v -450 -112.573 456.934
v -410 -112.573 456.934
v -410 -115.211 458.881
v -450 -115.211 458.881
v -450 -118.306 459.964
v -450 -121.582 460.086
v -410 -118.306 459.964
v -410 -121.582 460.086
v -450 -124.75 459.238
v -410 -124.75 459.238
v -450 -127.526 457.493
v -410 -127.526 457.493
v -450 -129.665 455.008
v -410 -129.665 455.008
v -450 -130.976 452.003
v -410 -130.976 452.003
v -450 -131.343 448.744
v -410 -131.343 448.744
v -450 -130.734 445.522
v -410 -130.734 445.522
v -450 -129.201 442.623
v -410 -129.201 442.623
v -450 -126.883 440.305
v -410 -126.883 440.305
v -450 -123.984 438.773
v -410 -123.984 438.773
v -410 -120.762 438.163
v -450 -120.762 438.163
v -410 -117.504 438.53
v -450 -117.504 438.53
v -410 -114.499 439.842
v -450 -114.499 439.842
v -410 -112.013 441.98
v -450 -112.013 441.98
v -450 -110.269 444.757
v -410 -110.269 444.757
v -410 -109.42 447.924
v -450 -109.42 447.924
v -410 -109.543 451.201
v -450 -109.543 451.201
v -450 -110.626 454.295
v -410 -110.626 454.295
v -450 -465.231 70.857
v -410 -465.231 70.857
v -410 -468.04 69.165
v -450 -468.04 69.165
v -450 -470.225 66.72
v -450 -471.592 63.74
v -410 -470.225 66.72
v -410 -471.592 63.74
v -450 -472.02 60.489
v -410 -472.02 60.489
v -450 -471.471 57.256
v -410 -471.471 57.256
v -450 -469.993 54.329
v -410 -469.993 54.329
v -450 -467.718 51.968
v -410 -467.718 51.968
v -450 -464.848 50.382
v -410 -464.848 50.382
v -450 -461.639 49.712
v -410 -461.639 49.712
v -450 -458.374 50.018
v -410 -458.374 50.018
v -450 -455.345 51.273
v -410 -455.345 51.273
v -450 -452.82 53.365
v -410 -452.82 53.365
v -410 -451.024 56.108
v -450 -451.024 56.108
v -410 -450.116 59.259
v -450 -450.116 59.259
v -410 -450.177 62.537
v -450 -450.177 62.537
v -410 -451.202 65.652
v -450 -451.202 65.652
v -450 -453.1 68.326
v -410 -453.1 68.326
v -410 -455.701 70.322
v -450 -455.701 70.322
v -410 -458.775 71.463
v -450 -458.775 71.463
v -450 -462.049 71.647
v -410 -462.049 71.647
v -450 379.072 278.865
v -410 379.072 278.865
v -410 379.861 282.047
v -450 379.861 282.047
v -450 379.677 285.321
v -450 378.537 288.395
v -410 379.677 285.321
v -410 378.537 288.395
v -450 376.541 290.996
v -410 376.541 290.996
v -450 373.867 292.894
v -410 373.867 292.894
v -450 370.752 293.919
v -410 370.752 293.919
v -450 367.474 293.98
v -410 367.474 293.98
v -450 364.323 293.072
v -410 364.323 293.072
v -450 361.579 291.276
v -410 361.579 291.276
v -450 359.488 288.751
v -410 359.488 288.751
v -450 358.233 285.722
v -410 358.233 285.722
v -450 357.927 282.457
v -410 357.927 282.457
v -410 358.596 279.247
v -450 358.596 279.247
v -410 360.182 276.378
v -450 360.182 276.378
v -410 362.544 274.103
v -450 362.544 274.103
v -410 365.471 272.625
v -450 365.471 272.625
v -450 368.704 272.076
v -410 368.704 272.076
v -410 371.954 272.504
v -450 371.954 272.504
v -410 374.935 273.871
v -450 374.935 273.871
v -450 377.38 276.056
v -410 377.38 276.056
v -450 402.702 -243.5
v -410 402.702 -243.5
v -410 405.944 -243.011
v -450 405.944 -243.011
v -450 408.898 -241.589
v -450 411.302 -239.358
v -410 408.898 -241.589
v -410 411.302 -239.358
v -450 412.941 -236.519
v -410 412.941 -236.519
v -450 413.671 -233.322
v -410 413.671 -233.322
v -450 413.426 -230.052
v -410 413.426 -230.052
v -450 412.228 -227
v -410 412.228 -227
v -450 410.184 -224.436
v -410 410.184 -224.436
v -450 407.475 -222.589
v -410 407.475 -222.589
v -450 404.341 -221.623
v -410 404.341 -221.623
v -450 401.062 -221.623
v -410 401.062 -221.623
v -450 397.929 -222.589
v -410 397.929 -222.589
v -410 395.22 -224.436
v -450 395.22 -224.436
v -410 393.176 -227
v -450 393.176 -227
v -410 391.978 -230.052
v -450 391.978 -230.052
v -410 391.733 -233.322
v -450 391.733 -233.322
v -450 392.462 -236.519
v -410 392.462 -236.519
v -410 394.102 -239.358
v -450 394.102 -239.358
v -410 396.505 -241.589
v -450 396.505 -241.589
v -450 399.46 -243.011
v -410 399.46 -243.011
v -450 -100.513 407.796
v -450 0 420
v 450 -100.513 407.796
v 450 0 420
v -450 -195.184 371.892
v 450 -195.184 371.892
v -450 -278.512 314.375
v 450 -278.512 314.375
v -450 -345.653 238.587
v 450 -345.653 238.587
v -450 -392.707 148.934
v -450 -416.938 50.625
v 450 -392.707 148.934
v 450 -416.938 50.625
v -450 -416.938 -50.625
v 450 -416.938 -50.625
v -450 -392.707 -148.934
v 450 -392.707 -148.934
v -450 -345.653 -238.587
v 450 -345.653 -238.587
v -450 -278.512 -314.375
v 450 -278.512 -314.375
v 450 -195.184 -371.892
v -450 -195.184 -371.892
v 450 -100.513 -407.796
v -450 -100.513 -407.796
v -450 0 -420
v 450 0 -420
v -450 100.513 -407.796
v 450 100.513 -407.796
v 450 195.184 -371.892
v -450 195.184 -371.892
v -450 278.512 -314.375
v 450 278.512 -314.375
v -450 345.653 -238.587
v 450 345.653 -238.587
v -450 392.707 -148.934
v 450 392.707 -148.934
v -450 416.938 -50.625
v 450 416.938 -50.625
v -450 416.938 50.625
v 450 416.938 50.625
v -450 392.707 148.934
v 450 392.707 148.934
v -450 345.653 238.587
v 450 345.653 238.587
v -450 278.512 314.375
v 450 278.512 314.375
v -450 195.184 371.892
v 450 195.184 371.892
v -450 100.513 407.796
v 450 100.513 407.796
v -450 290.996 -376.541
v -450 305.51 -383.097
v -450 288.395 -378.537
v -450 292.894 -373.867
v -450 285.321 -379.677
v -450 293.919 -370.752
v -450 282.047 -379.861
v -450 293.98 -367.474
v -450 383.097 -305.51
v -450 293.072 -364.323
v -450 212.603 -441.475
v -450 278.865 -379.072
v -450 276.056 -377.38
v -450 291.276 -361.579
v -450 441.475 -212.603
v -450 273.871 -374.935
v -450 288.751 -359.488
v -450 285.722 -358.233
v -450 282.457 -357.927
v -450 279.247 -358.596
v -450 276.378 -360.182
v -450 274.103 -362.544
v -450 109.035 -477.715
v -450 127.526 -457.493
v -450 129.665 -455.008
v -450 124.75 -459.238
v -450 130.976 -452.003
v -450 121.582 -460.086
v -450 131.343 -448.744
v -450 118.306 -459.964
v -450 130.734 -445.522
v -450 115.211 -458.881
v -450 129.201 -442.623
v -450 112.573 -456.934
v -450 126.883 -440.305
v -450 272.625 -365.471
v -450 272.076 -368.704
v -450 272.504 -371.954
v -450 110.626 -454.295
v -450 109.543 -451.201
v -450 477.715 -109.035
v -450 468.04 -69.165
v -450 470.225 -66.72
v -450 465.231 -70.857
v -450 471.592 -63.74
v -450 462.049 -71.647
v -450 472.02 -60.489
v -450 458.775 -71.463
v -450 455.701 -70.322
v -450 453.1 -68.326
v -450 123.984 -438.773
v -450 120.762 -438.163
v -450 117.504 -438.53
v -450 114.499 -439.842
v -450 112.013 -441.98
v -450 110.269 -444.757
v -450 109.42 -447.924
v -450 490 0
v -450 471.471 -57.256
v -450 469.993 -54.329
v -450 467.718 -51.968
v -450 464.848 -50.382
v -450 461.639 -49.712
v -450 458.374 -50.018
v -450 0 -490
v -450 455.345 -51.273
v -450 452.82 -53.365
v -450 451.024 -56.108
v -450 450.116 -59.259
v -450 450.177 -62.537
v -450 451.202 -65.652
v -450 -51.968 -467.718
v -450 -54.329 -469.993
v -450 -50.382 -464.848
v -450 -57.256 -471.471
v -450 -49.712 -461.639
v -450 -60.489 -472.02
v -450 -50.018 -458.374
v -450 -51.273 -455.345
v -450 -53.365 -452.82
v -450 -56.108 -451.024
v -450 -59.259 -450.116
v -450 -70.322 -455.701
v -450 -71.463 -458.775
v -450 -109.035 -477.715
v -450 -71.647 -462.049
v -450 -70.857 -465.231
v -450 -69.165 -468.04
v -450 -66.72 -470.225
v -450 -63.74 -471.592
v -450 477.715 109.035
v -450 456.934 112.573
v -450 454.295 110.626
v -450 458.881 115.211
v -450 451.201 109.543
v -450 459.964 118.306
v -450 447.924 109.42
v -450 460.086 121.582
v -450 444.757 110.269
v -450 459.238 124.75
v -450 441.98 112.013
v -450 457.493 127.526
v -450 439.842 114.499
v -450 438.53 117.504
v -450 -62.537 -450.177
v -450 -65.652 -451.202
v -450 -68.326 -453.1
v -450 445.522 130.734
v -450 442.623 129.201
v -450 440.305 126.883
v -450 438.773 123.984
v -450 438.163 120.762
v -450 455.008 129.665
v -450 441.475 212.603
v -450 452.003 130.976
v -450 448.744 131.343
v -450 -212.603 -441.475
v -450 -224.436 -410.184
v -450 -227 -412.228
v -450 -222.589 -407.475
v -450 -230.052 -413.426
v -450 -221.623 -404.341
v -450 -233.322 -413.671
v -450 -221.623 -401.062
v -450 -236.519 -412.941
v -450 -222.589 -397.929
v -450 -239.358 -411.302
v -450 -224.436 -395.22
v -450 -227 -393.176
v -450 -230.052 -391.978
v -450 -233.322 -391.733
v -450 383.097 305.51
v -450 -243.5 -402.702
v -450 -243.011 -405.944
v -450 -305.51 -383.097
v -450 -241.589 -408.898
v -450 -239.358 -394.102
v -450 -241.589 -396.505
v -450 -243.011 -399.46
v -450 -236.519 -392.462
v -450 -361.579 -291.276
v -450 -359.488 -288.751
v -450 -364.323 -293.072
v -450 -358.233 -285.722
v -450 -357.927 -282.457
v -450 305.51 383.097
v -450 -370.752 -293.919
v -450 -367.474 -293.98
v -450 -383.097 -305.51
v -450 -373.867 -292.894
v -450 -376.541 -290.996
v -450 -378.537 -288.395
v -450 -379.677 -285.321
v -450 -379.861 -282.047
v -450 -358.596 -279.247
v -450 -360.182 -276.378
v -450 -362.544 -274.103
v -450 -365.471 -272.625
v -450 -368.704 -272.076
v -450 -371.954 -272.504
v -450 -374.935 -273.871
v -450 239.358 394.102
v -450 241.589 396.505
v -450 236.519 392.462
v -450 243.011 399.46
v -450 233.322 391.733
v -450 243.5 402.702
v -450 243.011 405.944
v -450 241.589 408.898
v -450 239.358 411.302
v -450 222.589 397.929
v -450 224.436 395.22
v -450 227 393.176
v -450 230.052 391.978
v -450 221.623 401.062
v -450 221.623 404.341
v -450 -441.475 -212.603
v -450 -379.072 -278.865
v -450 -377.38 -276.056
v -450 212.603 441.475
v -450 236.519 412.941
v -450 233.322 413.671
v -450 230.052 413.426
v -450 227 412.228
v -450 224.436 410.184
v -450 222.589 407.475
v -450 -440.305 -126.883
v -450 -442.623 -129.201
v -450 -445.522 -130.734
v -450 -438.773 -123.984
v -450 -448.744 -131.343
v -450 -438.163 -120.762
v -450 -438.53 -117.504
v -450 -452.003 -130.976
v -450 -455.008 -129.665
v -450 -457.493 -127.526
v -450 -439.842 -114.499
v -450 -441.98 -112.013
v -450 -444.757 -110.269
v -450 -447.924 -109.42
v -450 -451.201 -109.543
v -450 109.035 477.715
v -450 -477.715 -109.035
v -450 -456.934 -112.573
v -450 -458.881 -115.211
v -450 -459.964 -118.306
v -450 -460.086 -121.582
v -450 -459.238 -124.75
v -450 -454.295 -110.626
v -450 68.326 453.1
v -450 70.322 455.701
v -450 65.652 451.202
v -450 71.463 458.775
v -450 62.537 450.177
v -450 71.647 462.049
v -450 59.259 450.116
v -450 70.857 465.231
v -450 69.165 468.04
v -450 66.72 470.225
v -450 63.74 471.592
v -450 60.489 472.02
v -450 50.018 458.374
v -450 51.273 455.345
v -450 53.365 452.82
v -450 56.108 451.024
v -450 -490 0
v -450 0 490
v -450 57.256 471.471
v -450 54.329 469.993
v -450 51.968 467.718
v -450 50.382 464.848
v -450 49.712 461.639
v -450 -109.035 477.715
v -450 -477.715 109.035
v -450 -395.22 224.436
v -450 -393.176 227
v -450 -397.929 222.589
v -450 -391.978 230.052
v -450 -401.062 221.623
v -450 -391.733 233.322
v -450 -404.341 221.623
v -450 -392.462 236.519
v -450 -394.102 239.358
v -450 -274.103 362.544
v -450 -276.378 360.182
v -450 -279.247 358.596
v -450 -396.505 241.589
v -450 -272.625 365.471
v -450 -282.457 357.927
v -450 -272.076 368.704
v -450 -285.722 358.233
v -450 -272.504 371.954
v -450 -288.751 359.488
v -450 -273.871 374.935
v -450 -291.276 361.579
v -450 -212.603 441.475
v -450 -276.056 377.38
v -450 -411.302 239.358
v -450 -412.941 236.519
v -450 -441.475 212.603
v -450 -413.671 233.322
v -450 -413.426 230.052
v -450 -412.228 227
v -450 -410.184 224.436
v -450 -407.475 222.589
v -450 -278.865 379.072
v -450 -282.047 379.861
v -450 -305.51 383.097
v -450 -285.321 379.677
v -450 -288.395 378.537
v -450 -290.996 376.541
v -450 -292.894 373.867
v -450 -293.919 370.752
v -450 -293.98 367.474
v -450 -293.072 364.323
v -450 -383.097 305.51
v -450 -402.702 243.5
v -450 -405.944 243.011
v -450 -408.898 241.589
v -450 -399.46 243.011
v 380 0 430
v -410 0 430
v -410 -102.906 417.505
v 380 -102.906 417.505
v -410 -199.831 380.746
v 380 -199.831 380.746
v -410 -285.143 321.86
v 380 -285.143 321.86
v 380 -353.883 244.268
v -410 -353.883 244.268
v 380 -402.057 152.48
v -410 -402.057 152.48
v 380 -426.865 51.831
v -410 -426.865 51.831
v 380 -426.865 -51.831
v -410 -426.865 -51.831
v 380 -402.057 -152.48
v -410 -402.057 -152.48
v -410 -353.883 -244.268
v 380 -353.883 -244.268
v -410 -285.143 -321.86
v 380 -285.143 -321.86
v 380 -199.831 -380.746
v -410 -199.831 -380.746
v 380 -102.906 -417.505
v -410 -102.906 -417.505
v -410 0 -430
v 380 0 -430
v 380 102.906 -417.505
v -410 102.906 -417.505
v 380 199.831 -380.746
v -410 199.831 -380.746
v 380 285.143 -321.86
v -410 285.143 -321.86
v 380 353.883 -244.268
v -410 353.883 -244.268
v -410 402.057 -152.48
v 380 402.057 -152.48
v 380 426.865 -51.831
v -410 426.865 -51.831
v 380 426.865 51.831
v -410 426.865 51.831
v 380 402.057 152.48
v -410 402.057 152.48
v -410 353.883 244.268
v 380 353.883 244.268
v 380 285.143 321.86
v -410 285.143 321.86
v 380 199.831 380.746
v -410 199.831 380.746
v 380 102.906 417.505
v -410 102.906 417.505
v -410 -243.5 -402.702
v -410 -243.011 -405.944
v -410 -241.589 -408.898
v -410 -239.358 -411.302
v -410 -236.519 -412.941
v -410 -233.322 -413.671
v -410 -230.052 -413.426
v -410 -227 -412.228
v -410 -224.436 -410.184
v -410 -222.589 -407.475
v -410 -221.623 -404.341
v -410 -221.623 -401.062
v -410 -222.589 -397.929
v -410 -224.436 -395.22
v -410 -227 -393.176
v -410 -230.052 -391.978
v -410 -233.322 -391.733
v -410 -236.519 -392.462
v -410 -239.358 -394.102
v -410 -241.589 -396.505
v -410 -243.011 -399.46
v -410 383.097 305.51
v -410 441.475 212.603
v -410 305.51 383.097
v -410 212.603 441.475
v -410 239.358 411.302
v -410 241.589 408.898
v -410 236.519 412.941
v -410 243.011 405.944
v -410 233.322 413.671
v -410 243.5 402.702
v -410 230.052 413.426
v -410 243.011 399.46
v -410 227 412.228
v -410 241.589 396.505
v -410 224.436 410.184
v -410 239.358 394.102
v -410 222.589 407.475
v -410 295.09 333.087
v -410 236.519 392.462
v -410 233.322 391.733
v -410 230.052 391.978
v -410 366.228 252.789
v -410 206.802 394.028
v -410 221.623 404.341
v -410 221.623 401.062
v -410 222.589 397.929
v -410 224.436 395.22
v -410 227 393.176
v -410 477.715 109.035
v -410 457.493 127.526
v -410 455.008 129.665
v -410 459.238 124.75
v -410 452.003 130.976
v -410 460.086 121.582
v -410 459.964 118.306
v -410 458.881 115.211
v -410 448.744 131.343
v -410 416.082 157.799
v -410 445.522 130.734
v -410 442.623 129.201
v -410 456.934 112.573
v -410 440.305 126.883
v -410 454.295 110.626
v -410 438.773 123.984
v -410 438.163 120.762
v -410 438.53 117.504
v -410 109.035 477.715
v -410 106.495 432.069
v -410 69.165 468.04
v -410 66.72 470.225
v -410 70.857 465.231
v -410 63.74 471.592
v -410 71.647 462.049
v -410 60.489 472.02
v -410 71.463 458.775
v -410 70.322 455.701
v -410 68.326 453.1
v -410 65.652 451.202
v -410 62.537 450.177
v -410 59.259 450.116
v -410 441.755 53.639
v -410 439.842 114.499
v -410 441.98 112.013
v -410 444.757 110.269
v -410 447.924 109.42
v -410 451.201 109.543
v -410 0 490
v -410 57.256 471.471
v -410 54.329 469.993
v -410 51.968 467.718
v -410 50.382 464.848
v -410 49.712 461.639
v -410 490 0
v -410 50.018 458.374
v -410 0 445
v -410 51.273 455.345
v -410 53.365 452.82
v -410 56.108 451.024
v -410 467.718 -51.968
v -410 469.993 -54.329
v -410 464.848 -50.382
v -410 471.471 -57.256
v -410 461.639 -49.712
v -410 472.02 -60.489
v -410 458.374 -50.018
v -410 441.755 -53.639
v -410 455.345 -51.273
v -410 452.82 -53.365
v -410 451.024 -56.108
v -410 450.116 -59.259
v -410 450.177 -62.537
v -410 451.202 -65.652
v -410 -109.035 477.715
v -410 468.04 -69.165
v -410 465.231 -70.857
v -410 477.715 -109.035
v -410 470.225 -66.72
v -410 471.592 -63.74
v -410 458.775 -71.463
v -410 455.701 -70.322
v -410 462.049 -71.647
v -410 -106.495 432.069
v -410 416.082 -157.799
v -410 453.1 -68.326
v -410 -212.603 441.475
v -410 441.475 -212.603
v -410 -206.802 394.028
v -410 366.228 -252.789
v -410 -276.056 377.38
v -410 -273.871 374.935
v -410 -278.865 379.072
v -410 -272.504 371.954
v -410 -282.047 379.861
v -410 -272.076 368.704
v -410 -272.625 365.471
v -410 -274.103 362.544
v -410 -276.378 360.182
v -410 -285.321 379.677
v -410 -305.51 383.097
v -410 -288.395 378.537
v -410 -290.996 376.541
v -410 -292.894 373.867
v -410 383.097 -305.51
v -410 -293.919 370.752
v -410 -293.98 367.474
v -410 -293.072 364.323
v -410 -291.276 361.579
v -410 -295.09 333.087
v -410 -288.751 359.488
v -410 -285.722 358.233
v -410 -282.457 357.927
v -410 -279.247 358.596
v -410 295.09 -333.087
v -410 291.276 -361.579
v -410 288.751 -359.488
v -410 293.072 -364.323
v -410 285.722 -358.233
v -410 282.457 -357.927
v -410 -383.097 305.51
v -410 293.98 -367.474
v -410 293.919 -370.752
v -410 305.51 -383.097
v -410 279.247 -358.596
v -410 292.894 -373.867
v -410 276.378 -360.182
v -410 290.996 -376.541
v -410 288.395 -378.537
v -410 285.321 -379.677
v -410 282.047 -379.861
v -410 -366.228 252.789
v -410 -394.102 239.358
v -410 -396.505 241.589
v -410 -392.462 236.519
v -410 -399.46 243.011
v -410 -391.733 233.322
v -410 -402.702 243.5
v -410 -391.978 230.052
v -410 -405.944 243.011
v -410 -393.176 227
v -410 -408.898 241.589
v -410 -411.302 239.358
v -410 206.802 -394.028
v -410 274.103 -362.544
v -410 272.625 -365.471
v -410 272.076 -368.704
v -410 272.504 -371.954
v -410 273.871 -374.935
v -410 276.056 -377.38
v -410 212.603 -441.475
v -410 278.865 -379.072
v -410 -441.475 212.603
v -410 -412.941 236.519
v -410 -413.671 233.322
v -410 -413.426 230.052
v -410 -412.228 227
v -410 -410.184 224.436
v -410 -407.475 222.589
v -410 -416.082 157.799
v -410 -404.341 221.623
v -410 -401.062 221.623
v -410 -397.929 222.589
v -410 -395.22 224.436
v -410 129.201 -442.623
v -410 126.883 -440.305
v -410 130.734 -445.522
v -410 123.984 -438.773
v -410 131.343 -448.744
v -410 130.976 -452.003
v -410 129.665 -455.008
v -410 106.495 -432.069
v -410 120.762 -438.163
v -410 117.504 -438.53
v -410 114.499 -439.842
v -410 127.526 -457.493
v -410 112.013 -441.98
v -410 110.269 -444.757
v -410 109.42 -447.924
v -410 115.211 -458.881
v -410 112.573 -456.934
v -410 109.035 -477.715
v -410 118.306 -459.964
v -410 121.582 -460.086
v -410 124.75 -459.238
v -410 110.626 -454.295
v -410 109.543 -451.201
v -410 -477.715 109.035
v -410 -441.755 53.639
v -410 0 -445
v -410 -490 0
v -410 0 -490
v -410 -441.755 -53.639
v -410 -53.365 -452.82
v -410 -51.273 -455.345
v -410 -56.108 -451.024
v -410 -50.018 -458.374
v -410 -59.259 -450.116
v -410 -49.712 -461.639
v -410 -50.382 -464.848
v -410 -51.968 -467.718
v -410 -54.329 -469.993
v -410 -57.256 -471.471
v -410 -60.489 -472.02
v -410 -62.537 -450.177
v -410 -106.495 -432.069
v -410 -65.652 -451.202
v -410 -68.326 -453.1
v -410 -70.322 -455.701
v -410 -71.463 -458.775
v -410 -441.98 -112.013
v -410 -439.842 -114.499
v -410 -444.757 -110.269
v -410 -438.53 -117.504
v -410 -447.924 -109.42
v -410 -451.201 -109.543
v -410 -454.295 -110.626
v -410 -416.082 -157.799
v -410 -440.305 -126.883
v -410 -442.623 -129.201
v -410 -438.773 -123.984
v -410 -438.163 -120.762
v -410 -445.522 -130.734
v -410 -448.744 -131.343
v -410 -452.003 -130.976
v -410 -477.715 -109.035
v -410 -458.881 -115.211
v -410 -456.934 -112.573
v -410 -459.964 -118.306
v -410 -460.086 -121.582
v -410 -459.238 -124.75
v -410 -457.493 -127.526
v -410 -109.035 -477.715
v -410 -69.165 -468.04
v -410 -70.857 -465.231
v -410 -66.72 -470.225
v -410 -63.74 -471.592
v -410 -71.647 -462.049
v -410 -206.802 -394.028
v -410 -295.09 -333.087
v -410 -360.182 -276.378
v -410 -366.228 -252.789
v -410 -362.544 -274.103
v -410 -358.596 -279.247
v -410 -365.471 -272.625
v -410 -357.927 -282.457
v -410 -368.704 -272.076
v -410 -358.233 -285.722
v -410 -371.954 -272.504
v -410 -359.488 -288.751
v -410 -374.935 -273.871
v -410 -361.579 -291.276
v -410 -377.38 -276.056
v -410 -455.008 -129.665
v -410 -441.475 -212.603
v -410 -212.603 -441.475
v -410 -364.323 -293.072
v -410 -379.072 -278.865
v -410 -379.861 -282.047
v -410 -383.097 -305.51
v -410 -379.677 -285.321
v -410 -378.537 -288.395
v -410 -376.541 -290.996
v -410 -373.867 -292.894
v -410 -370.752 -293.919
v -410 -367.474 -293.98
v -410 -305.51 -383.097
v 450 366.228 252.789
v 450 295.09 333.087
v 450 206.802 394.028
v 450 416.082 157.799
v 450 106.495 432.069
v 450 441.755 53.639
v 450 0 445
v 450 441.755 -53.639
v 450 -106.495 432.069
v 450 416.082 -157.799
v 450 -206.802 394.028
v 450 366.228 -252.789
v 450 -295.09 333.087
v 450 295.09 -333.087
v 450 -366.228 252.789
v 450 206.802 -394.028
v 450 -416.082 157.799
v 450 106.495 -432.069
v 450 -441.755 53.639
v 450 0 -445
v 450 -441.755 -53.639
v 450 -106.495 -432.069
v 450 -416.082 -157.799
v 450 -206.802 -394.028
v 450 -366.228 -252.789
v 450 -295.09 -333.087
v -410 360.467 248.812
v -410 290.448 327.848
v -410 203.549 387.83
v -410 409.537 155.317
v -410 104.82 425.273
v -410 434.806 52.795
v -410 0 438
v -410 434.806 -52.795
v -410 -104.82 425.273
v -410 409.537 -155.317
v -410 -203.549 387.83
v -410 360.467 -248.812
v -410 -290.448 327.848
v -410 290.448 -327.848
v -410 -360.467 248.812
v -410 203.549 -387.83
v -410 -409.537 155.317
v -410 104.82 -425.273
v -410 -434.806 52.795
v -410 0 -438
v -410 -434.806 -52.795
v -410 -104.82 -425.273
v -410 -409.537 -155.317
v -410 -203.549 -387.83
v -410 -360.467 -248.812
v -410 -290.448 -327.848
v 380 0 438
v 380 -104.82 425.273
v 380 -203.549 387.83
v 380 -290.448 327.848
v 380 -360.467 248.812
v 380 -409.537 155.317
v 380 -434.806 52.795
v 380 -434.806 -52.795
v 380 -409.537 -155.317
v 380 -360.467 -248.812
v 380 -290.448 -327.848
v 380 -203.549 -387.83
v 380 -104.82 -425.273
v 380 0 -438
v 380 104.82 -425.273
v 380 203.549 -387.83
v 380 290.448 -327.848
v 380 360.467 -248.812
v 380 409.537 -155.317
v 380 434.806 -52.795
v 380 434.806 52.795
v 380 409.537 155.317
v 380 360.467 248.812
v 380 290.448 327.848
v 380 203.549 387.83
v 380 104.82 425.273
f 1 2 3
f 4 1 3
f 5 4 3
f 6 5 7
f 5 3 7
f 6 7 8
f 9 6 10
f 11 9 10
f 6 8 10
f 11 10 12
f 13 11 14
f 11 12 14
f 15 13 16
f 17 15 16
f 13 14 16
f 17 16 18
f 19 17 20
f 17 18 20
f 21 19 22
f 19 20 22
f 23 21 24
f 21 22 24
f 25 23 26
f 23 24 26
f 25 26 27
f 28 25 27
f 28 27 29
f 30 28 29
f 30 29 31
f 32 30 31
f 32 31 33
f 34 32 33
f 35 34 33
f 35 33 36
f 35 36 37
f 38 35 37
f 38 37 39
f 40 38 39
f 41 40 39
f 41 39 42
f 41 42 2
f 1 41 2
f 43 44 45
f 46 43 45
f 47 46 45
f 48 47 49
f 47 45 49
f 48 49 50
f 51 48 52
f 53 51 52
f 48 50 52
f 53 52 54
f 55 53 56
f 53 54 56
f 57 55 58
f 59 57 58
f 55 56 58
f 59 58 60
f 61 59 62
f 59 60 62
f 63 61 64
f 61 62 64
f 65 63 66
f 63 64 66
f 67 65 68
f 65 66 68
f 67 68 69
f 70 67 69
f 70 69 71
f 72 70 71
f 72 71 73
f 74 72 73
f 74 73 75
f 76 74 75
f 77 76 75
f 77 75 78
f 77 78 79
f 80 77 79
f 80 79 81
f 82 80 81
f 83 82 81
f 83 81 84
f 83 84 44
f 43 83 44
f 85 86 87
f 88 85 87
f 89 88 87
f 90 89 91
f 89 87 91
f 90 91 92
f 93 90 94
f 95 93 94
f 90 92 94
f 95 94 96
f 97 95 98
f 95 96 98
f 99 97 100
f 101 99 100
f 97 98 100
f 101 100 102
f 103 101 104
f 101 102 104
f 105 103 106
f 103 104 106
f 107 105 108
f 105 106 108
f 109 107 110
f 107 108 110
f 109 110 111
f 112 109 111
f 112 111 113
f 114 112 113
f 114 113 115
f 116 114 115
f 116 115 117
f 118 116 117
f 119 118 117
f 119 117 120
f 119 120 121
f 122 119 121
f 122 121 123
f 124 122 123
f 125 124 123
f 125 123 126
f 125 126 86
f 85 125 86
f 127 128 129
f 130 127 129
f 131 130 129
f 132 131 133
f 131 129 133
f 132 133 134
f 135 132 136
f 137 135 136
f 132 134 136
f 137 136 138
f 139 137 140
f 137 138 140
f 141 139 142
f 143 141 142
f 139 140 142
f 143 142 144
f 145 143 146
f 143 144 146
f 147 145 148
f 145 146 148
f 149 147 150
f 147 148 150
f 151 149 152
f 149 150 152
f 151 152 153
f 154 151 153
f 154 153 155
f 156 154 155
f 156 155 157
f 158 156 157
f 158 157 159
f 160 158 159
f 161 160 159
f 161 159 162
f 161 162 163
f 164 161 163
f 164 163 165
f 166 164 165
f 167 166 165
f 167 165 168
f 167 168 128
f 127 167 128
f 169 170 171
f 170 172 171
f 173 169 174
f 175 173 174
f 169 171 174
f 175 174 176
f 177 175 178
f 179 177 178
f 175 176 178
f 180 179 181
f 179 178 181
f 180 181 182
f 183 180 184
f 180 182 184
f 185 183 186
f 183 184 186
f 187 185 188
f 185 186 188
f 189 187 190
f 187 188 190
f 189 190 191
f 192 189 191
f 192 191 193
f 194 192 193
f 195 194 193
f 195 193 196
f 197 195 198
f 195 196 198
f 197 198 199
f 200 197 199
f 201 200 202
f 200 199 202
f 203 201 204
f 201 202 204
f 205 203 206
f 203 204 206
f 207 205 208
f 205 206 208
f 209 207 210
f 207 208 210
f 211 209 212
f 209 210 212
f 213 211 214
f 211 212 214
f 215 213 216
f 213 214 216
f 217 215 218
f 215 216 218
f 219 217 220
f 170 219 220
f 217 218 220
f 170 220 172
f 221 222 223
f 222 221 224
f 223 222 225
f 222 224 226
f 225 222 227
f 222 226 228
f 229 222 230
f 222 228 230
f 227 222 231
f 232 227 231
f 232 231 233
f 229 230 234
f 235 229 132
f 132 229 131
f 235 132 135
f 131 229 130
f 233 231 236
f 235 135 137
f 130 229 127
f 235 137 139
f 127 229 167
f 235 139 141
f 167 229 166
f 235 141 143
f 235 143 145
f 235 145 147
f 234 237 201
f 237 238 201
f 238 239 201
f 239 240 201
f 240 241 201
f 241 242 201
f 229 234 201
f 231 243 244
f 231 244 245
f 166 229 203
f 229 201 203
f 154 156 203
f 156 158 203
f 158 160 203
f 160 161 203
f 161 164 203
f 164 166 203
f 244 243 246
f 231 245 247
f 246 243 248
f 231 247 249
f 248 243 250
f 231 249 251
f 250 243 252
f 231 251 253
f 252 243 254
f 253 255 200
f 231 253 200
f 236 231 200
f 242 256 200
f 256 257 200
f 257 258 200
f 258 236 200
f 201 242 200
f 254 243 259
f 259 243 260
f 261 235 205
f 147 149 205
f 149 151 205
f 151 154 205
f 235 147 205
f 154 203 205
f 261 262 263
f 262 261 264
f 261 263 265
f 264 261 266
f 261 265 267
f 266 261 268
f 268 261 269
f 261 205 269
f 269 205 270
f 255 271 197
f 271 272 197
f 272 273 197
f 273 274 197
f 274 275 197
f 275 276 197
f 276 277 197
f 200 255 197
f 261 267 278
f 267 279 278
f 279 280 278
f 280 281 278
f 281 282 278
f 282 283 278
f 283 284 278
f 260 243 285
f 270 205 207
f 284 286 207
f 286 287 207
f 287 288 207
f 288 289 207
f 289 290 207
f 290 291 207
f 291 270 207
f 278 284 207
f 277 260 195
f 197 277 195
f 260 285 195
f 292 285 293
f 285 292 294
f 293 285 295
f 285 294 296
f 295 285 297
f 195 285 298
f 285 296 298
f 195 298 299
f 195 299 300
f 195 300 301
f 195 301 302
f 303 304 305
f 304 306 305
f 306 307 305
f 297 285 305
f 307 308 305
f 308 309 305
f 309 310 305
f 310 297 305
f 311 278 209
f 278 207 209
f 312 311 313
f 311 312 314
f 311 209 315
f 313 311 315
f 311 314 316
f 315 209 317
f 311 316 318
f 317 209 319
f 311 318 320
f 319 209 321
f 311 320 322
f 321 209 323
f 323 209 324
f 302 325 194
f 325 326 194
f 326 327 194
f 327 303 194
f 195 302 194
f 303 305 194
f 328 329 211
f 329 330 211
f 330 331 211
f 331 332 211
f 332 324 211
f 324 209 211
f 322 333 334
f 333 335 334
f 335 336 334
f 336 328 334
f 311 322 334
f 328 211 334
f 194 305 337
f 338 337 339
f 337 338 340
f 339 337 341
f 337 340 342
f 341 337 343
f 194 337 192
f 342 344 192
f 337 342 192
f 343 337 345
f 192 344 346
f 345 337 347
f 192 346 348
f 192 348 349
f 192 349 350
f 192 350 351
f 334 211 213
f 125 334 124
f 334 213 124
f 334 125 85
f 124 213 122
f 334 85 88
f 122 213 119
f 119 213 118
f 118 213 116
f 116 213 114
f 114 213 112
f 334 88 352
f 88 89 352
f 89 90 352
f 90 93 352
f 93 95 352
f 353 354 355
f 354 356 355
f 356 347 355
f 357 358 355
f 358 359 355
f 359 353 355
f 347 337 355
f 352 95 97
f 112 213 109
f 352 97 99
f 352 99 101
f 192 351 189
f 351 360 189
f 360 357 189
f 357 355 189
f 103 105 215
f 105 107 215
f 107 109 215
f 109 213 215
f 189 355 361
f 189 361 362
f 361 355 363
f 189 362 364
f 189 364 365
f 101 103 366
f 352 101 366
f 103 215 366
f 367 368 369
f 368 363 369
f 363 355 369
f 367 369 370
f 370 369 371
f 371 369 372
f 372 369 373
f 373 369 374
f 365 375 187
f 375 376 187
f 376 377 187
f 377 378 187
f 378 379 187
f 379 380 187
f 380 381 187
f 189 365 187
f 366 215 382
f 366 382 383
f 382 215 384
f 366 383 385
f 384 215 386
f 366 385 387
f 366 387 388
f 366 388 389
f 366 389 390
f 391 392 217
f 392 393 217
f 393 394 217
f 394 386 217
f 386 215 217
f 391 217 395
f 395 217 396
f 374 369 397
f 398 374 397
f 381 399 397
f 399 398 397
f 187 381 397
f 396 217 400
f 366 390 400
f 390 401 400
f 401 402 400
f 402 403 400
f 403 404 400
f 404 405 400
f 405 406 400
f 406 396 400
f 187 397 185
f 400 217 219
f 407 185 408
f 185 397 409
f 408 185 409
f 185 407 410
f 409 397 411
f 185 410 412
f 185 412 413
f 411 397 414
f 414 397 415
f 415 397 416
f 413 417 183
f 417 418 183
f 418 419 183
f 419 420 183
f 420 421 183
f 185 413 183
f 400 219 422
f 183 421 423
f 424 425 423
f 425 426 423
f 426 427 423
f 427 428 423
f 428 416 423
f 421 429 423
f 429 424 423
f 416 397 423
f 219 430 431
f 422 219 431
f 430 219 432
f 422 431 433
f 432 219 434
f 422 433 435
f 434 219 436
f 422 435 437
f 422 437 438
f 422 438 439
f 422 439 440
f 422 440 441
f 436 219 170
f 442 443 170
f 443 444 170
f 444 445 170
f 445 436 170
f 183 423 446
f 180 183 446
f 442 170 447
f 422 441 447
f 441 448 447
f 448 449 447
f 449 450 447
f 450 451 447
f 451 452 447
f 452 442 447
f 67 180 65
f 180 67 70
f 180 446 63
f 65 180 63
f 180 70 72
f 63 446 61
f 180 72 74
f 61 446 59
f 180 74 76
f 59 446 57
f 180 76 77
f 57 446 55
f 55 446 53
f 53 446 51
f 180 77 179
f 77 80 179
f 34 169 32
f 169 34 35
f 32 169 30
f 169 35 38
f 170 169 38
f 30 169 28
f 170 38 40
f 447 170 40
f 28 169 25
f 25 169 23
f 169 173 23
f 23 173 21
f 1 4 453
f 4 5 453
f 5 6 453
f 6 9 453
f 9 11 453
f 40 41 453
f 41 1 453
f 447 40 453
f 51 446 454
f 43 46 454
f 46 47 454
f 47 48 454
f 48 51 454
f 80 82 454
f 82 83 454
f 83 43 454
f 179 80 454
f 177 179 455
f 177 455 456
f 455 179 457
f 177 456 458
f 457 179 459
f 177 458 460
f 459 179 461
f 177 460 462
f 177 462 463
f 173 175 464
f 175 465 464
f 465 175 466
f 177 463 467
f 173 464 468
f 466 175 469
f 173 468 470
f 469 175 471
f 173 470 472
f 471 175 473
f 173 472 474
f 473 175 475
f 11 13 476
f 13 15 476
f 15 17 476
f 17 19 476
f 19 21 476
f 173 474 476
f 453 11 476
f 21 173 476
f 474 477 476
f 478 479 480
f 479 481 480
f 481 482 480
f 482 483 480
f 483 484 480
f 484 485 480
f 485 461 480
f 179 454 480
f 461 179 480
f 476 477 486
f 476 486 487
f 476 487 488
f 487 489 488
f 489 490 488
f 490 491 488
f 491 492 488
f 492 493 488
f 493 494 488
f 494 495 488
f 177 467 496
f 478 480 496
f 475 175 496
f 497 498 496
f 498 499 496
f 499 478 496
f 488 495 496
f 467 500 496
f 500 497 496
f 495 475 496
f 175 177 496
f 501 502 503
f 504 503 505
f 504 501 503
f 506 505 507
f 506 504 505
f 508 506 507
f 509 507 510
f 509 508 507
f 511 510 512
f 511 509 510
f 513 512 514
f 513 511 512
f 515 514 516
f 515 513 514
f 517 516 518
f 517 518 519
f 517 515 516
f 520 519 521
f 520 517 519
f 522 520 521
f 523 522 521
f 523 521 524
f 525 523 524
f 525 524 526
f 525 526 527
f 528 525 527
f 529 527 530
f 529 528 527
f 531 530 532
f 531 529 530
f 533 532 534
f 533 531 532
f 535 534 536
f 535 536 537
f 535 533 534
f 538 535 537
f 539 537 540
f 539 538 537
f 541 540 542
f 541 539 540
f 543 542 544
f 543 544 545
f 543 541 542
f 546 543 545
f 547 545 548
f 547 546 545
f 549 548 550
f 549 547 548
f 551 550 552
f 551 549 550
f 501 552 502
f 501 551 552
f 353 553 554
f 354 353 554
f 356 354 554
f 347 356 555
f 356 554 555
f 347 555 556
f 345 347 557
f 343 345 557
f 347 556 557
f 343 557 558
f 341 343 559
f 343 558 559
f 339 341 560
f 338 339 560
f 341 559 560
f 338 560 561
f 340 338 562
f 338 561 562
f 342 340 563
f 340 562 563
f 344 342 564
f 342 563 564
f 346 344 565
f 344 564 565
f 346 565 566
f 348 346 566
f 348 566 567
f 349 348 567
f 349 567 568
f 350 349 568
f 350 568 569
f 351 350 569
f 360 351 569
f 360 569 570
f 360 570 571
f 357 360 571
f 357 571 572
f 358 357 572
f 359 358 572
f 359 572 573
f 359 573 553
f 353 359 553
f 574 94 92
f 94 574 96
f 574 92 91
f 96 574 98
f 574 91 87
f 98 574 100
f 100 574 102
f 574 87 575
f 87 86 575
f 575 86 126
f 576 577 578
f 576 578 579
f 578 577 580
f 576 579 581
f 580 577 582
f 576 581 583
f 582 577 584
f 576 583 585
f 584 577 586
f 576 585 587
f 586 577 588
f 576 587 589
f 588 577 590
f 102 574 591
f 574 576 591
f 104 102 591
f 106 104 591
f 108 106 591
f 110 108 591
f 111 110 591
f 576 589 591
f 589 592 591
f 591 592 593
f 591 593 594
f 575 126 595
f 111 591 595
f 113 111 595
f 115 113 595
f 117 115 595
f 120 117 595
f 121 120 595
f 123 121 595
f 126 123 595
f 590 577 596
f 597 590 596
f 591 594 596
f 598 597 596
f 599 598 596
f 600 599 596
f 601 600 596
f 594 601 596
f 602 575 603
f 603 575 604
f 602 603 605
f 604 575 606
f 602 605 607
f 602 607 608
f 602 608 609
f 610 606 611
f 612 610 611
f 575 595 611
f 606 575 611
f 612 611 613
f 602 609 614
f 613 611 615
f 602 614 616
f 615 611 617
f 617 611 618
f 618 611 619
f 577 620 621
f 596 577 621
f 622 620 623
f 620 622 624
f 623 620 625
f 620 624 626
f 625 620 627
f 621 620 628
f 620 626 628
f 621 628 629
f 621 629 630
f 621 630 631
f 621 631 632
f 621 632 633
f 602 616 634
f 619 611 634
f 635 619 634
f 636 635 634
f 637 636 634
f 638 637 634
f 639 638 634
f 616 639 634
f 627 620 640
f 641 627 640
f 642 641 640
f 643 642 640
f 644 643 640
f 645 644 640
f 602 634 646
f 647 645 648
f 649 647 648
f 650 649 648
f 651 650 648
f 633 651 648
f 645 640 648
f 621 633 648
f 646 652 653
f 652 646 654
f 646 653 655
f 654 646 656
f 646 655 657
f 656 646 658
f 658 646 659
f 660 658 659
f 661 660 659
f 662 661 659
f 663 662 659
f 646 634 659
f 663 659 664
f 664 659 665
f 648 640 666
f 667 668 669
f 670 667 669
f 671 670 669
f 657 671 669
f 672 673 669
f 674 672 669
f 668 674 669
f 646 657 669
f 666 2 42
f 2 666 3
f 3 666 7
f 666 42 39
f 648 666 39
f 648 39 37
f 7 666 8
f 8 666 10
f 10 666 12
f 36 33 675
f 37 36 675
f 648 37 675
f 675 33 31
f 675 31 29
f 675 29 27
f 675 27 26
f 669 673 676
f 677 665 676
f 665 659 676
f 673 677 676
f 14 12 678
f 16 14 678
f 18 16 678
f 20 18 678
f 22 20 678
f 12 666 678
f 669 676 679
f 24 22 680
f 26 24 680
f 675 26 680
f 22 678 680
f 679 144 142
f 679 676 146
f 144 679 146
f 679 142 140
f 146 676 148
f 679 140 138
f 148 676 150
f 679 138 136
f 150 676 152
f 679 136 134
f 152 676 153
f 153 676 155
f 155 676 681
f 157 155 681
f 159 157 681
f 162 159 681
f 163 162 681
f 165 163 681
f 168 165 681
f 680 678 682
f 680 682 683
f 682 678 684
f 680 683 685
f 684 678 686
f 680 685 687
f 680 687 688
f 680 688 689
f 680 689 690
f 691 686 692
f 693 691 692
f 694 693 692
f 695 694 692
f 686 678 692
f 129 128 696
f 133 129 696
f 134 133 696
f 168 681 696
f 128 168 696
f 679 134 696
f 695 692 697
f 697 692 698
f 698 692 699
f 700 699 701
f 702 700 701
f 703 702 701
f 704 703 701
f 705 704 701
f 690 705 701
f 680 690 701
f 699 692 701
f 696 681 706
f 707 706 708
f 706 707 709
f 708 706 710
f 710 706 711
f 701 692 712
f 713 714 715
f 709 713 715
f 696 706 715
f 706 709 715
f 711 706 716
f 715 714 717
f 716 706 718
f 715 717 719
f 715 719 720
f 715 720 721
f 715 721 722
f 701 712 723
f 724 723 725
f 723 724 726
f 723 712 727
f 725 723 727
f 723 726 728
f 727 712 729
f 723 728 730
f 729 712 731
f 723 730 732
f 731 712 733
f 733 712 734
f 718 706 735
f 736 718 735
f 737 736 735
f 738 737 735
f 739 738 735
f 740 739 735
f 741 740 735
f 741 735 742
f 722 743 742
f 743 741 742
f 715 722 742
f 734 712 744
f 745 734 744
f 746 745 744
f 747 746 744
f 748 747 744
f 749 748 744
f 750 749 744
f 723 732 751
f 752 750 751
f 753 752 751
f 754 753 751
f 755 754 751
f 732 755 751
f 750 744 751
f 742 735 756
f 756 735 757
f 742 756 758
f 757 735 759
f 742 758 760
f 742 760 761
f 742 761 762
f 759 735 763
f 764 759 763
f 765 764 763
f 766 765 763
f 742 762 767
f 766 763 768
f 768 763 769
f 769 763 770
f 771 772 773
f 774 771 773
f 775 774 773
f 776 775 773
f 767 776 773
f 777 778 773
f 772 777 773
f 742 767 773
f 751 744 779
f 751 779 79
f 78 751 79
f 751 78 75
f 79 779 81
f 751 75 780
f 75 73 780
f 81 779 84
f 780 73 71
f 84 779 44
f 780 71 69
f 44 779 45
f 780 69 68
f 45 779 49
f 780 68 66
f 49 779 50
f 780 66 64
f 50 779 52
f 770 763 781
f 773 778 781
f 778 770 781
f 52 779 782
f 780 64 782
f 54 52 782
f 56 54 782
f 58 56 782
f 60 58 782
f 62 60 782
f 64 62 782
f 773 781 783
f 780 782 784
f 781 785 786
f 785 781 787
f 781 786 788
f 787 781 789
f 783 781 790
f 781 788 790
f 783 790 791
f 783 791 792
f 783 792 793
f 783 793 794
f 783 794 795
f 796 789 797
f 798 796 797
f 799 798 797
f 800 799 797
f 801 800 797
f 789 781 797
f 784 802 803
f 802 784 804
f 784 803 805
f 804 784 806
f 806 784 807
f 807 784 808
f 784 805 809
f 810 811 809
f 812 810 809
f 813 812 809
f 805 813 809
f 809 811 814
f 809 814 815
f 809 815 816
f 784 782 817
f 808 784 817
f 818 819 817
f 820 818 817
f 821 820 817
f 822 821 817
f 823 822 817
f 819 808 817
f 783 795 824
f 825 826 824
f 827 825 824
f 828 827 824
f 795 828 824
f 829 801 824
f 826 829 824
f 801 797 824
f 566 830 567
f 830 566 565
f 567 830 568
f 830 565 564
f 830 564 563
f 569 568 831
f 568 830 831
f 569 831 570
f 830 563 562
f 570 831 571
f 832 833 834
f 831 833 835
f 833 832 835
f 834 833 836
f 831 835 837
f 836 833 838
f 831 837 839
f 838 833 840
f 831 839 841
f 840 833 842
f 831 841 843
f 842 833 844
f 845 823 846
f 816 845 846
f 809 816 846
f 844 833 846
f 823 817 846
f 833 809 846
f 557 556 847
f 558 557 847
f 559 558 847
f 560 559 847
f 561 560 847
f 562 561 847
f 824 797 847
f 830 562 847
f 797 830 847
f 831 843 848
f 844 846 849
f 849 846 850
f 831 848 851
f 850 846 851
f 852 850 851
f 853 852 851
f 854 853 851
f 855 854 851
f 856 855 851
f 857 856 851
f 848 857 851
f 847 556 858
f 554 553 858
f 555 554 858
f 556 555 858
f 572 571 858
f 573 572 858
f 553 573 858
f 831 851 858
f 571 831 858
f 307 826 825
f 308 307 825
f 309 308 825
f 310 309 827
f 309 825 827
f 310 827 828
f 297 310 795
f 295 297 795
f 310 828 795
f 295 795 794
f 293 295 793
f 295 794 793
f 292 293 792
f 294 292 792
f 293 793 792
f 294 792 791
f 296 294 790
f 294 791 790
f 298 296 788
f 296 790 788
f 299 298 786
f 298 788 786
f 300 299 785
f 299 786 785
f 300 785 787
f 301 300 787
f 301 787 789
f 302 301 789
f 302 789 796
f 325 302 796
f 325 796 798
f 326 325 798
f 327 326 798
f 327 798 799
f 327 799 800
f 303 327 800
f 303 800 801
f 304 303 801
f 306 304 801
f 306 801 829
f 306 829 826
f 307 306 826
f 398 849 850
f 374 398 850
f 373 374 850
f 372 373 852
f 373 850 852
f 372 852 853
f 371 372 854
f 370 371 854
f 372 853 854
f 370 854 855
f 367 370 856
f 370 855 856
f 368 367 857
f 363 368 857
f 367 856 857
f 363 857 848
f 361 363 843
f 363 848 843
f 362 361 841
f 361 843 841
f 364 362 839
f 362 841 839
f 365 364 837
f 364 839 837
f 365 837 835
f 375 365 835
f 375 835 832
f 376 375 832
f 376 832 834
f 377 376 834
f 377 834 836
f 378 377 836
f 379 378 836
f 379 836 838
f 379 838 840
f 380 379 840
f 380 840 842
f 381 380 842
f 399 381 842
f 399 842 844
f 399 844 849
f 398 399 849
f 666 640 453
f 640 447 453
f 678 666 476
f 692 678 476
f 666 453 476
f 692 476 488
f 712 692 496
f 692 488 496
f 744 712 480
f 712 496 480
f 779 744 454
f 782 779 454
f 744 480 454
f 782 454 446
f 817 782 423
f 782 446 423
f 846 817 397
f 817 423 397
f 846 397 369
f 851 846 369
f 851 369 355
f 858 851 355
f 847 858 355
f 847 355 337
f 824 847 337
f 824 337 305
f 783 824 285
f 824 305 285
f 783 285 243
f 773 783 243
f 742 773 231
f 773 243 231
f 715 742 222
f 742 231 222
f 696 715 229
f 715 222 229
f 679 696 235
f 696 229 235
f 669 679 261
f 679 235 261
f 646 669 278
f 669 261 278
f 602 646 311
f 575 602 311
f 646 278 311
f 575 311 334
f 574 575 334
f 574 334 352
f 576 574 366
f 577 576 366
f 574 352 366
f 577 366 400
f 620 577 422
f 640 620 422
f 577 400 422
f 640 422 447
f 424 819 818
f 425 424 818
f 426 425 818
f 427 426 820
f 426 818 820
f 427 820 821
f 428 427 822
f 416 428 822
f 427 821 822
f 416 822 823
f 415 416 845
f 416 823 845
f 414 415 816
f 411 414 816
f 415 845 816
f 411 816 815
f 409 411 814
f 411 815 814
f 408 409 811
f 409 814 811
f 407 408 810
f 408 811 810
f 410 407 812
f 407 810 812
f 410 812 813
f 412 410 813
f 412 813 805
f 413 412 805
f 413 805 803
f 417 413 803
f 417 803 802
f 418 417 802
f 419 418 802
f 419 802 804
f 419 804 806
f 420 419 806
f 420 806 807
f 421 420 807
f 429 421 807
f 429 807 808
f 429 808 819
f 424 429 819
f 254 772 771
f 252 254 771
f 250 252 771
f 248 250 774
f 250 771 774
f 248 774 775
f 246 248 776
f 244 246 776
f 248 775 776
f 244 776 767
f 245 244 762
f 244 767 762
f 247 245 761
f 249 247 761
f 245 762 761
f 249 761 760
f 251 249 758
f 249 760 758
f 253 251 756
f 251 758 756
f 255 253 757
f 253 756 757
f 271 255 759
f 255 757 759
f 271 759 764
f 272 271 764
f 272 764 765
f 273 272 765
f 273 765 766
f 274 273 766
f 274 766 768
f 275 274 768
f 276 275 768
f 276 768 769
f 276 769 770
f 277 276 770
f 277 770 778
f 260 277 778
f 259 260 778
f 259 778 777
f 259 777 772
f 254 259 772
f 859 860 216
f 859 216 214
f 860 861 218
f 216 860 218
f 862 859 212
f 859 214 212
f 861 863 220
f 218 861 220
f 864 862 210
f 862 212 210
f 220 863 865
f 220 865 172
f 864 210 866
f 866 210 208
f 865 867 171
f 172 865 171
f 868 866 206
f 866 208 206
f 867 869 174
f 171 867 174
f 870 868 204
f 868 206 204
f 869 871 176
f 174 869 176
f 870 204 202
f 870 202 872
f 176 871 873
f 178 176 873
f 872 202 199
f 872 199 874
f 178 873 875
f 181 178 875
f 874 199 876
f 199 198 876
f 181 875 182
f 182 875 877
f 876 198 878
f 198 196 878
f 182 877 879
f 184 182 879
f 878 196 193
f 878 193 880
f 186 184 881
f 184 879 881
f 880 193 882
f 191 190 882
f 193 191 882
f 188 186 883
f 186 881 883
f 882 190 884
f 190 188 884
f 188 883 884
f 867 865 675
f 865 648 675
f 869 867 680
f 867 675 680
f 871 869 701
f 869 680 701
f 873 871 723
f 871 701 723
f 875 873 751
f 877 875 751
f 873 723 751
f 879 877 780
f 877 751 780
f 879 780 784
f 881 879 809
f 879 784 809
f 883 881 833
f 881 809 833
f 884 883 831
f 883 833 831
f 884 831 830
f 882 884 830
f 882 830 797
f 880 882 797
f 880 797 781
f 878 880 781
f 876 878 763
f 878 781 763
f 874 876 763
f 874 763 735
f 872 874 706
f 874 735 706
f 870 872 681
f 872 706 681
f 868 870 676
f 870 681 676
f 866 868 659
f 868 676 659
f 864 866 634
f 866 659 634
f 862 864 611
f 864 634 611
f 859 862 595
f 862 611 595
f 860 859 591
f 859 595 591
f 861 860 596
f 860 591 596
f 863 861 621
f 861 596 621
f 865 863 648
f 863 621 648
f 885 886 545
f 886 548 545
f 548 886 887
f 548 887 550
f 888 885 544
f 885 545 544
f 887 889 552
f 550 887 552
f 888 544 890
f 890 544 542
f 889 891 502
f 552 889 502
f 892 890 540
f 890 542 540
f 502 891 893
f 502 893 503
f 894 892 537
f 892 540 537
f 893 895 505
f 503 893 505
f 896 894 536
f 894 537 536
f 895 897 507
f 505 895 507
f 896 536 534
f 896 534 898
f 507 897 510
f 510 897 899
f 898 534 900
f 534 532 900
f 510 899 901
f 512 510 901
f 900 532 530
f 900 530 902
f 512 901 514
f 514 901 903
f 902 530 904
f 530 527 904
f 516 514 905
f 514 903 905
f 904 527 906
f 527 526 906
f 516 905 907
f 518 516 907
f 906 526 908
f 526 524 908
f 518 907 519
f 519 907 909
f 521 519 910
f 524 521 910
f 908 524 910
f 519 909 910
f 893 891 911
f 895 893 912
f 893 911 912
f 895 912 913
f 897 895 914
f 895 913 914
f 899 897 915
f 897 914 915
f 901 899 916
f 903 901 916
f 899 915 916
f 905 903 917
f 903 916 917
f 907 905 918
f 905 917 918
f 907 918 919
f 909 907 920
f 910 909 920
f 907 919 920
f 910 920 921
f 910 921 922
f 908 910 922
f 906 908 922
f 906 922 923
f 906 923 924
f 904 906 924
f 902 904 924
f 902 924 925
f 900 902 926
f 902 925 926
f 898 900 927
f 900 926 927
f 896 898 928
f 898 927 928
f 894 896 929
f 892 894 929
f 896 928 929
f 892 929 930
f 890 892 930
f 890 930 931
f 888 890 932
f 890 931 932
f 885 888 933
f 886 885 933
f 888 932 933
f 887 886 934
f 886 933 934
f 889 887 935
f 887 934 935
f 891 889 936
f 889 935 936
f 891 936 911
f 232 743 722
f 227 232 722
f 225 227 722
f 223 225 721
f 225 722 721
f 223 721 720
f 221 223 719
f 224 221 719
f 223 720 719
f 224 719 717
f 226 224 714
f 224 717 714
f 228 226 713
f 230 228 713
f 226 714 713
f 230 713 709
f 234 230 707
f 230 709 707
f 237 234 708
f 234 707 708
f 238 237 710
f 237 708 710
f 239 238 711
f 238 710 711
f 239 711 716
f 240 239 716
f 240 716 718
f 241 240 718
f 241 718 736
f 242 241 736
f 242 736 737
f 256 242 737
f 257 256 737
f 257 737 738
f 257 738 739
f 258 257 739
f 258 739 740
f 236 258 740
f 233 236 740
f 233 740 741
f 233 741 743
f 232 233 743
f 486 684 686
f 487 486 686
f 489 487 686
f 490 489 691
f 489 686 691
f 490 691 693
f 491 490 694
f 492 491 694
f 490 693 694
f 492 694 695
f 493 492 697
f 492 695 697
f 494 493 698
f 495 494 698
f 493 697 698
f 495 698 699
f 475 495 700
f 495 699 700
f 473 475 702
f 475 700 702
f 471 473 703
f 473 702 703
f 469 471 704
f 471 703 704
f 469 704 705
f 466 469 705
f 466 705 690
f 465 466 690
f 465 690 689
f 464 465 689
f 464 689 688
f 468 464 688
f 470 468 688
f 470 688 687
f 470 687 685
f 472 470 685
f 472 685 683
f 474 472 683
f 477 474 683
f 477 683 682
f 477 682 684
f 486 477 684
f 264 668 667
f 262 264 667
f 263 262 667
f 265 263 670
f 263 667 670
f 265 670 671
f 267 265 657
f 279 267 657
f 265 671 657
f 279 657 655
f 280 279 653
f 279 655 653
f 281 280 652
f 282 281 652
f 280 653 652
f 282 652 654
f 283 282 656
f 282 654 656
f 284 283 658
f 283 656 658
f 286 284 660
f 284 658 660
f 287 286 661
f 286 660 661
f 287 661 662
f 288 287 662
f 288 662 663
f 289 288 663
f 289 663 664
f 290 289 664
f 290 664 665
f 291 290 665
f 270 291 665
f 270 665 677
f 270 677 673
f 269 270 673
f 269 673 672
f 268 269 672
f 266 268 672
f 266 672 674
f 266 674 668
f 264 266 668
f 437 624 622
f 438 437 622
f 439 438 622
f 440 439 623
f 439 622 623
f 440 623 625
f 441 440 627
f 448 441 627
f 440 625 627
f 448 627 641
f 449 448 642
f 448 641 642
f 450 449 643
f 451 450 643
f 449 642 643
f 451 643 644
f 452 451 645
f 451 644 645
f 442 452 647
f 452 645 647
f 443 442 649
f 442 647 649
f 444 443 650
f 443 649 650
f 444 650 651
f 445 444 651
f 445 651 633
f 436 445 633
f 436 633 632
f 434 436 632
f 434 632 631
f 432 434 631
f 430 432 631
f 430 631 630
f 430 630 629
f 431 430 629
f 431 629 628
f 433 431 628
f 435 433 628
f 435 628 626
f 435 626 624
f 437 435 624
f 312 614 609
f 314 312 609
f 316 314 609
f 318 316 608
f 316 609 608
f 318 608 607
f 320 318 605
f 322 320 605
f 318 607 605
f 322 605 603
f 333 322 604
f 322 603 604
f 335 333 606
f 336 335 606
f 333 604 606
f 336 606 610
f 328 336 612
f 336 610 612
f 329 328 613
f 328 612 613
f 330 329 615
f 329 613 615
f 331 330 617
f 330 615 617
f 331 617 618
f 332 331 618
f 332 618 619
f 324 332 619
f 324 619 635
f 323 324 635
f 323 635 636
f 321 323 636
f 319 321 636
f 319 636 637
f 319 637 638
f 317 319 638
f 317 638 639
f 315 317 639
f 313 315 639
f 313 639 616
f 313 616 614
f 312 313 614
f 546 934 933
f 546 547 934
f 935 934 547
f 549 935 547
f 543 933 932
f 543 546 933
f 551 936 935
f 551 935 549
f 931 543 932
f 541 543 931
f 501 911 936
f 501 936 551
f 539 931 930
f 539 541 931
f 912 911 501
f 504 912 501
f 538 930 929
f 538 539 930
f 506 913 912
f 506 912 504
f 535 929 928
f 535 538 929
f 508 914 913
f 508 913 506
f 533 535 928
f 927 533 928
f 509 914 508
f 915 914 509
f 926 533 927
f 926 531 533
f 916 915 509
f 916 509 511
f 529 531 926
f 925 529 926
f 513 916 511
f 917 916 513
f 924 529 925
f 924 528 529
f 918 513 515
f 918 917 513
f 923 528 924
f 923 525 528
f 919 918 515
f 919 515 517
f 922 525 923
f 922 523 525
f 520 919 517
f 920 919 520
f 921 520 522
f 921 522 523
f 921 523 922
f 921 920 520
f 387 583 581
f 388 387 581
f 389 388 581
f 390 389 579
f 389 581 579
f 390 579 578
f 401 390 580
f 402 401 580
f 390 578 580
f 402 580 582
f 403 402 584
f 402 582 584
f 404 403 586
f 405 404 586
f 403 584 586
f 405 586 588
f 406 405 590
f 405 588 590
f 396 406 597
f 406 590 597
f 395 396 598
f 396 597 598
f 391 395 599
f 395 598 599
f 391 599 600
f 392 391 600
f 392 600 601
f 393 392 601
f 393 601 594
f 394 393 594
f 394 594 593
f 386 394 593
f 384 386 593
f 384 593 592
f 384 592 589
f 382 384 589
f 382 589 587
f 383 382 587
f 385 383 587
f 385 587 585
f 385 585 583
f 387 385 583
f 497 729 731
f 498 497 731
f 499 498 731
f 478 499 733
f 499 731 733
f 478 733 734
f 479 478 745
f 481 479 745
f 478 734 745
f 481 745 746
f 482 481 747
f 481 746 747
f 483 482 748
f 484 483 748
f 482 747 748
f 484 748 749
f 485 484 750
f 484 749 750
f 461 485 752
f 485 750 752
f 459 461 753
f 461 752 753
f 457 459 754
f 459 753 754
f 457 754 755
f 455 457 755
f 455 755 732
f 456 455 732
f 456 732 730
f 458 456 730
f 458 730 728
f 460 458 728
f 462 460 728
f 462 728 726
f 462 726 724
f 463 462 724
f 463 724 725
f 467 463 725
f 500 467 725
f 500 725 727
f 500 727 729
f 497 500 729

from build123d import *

# Parameters (mm, degrees)
F0_W            = 790
F0_H            = 6
F2_W            = 790
F2_H            = 8
F5_D            = 22
F5_COPIES_COUNT = 16


# Not quite as in the source:
# - a pattern or mirror of a feature is missing from the dataset's text; its kind, count and spacing are read off the source's solid


with BuildPart() as f1:
    # F0 (on Front) → F1 (revolve)
    with BuildSketch(Plane.XZ):
        Polygon((-450, 490), (-450, 420), (450, 420), (450, 445), (-410, 445), (-410, 490), align=None)
        with Locations((-15, 435)):
            Rectangle(F0_W, F0_H, mode=Mode.SUBTRACT)
    revolve(axis=Axis((-71.5964585543, 0, 0), (1, 0, 0)))

    # F2 (on Front) → F3 (revolve, cut)
    with BuildSketch(Plane.XZ):
        with Locations((-15, 434)):
            Rectangle(F2_W, F2_H)
    revolve(axis=Axis((-160.7926189899, 0, 0), (1, 0, 0)), mode=Mode.SUBTRACT)

    # F5 (through all)
    with Locations(Plane(origin=(-450, 0, 0), x_dir=(0, -1, 0), z_dir=(-1, 0, 0))):
        with Locations((-232.5, 402.7018127598)):
            f5 = Hole(F5_D / 2)

    # F5_copies: F5 ×16 about axis
    f5_copies_axis = Axis((0, 0, 0), (1, 0, 0))
    for i in range(1, F5_COPIES_COUNT):
        add(f5.rotate(f5_copies_axis, i * 360 / F5_COPIES_COUNT), mode=Mode.SUBTRACT)


solid = f1.part
